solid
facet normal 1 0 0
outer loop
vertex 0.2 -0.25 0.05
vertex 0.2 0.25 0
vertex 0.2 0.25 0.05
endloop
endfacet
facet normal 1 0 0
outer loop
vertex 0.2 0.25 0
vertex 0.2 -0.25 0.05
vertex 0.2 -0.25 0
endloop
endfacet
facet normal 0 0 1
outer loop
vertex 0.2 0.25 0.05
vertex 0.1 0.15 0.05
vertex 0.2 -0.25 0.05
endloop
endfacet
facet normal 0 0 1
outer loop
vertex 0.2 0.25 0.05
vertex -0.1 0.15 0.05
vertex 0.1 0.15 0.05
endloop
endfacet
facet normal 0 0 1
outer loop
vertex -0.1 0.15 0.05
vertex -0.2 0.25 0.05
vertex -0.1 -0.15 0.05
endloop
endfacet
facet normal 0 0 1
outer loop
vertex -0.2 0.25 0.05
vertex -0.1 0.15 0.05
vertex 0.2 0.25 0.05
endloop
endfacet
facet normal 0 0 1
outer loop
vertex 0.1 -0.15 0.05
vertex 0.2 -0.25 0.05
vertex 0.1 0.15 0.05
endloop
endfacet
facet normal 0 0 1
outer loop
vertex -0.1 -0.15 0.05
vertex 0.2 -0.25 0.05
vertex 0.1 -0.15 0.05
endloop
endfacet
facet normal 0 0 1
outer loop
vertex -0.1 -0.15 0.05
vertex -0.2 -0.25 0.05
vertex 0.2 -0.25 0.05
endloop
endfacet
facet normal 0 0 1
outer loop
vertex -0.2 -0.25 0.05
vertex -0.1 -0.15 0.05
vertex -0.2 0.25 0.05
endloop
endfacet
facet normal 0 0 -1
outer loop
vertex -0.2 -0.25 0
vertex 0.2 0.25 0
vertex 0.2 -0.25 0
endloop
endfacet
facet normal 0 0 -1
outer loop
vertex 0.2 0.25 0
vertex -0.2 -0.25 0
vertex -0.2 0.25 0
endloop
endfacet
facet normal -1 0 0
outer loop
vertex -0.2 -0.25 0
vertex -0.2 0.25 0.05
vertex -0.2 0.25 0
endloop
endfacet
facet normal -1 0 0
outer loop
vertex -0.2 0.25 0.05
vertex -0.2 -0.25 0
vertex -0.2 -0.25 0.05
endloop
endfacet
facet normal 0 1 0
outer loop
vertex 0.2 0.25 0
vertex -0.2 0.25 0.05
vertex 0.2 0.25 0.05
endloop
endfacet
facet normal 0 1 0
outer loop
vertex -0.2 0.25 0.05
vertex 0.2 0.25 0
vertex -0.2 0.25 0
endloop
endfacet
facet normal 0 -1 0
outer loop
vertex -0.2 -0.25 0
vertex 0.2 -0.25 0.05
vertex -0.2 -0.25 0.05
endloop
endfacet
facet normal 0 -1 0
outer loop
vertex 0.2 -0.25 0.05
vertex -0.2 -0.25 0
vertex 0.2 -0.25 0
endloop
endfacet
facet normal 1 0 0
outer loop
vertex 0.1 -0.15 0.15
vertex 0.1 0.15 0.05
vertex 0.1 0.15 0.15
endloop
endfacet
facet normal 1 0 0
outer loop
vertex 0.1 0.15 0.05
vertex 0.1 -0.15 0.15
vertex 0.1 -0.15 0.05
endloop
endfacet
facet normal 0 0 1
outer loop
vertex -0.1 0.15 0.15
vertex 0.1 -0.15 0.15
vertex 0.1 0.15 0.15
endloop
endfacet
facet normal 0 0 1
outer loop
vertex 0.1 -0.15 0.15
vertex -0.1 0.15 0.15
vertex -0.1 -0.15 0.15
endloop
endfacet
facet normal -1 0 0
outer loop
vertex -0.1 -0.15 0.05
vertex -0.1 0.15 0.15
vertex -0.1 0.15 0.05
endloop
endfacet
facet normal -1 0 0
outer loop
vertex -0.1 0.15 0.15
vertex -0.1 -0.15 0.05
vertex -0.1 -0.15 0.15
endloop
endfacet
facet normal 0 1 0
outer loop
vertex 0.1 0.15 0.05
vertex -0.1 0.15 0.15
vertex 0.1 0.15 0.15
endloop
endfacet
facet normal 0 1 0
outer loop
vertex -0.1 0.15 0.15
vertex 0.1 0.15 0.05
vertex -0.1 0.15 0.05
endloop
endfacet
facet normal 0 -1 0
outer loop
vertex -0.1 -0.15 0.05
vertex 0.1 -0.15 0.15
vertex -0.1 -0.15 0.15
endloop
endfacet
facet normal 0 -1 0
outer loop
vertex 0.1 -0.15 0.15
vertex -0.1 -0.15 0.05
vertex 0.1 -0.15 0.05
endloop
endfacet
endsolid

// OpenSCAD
module plate_with_boss() {
    difference() {
        // Main plate
        translate([-0.2, -0.25, 0])
        cube([0.4, 0.5, 0.05]);
        
        // Cutout for boss
        translate([-0.1, -0.15, 0.05])
        cube([0.2, 0.3, 0.05]);
    }
    // Boss
    translate([-0.1, -0.15, 0.05])
    cube([0.2, 0.3, 0.1]);
}

plate_with_boss();
